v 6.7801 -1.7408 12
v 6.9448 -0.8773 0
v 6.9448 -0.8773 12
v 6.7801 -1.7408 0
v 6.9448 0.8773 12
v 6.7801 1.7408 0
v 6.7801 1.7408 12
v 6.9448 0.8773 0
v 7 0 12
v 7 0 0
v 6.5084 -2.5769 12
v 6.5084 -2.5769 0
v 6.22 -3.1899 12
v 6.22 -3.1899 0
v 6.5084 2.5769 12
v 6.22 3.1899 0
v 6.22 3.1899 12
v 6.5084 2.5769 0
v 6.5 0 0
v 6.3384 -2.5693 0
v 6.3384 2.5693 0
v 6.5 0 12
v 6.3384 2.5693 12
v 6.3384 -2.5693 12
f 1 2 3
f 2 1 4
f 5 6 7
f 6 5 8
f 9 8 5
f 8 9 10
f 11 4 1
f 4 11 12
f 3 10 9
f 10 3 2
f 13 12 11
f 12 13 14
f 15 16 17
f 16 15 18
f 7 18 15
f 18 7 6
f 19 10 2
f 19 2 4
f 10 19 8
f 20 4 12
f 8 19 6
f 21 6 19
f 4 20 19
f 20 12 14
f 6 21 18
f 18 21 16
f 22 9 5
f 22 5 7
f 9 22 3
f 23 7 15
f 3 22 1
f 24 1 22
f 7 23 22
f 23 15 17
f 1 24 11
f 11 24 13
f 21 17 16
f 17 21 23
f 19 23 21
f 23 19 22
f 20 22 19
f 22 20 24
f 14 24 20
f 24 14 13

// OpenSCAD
$fn = 50;


difference() {
	union() {
		cylinder(h = 12, r = 7.0000000000);
		translate(v = [-17.0000000000, 0, 0]) {
			cylinder(h = 12, r = 7.0000000000);
		}
	}
	union() {
		cylinder(h = 12, r = 3.2500000000);
		cylinder(h = 12, r = 1.8000000000);
		cylinder(h = 12, r = 1.8000000000);
		cylinder(h = 12, r = 1.8000000000);
		translate(v = [-21.5000000000, 0, 0]) {
			hull() {
				translate(v = [-3.7500000000, 0.0000000000, 0]) {
					cylinder(h = 12, r = 10.5000000000);
				}
				translate(v = [3.7500000000, 0.0000000000, 0]) {
					cylinder(h = 12, r = 10.5000000000);
				}
				translate(v = [-3.7500000000, -0.0000000000, 0]) {
					cylinder(h = 12, r = 10.5000000000);
				}
				translate(v = [3.7500000000, -0.0000000000, 0]) {
					cylinder(h = 12, r = 10.5000000000);
				}
			}
		}
		translate(v = [-14.0000000000, 0, 0.0000000000]) {
			cylinder(h = 12, r = 20.5000000000);
		}
	}
}
